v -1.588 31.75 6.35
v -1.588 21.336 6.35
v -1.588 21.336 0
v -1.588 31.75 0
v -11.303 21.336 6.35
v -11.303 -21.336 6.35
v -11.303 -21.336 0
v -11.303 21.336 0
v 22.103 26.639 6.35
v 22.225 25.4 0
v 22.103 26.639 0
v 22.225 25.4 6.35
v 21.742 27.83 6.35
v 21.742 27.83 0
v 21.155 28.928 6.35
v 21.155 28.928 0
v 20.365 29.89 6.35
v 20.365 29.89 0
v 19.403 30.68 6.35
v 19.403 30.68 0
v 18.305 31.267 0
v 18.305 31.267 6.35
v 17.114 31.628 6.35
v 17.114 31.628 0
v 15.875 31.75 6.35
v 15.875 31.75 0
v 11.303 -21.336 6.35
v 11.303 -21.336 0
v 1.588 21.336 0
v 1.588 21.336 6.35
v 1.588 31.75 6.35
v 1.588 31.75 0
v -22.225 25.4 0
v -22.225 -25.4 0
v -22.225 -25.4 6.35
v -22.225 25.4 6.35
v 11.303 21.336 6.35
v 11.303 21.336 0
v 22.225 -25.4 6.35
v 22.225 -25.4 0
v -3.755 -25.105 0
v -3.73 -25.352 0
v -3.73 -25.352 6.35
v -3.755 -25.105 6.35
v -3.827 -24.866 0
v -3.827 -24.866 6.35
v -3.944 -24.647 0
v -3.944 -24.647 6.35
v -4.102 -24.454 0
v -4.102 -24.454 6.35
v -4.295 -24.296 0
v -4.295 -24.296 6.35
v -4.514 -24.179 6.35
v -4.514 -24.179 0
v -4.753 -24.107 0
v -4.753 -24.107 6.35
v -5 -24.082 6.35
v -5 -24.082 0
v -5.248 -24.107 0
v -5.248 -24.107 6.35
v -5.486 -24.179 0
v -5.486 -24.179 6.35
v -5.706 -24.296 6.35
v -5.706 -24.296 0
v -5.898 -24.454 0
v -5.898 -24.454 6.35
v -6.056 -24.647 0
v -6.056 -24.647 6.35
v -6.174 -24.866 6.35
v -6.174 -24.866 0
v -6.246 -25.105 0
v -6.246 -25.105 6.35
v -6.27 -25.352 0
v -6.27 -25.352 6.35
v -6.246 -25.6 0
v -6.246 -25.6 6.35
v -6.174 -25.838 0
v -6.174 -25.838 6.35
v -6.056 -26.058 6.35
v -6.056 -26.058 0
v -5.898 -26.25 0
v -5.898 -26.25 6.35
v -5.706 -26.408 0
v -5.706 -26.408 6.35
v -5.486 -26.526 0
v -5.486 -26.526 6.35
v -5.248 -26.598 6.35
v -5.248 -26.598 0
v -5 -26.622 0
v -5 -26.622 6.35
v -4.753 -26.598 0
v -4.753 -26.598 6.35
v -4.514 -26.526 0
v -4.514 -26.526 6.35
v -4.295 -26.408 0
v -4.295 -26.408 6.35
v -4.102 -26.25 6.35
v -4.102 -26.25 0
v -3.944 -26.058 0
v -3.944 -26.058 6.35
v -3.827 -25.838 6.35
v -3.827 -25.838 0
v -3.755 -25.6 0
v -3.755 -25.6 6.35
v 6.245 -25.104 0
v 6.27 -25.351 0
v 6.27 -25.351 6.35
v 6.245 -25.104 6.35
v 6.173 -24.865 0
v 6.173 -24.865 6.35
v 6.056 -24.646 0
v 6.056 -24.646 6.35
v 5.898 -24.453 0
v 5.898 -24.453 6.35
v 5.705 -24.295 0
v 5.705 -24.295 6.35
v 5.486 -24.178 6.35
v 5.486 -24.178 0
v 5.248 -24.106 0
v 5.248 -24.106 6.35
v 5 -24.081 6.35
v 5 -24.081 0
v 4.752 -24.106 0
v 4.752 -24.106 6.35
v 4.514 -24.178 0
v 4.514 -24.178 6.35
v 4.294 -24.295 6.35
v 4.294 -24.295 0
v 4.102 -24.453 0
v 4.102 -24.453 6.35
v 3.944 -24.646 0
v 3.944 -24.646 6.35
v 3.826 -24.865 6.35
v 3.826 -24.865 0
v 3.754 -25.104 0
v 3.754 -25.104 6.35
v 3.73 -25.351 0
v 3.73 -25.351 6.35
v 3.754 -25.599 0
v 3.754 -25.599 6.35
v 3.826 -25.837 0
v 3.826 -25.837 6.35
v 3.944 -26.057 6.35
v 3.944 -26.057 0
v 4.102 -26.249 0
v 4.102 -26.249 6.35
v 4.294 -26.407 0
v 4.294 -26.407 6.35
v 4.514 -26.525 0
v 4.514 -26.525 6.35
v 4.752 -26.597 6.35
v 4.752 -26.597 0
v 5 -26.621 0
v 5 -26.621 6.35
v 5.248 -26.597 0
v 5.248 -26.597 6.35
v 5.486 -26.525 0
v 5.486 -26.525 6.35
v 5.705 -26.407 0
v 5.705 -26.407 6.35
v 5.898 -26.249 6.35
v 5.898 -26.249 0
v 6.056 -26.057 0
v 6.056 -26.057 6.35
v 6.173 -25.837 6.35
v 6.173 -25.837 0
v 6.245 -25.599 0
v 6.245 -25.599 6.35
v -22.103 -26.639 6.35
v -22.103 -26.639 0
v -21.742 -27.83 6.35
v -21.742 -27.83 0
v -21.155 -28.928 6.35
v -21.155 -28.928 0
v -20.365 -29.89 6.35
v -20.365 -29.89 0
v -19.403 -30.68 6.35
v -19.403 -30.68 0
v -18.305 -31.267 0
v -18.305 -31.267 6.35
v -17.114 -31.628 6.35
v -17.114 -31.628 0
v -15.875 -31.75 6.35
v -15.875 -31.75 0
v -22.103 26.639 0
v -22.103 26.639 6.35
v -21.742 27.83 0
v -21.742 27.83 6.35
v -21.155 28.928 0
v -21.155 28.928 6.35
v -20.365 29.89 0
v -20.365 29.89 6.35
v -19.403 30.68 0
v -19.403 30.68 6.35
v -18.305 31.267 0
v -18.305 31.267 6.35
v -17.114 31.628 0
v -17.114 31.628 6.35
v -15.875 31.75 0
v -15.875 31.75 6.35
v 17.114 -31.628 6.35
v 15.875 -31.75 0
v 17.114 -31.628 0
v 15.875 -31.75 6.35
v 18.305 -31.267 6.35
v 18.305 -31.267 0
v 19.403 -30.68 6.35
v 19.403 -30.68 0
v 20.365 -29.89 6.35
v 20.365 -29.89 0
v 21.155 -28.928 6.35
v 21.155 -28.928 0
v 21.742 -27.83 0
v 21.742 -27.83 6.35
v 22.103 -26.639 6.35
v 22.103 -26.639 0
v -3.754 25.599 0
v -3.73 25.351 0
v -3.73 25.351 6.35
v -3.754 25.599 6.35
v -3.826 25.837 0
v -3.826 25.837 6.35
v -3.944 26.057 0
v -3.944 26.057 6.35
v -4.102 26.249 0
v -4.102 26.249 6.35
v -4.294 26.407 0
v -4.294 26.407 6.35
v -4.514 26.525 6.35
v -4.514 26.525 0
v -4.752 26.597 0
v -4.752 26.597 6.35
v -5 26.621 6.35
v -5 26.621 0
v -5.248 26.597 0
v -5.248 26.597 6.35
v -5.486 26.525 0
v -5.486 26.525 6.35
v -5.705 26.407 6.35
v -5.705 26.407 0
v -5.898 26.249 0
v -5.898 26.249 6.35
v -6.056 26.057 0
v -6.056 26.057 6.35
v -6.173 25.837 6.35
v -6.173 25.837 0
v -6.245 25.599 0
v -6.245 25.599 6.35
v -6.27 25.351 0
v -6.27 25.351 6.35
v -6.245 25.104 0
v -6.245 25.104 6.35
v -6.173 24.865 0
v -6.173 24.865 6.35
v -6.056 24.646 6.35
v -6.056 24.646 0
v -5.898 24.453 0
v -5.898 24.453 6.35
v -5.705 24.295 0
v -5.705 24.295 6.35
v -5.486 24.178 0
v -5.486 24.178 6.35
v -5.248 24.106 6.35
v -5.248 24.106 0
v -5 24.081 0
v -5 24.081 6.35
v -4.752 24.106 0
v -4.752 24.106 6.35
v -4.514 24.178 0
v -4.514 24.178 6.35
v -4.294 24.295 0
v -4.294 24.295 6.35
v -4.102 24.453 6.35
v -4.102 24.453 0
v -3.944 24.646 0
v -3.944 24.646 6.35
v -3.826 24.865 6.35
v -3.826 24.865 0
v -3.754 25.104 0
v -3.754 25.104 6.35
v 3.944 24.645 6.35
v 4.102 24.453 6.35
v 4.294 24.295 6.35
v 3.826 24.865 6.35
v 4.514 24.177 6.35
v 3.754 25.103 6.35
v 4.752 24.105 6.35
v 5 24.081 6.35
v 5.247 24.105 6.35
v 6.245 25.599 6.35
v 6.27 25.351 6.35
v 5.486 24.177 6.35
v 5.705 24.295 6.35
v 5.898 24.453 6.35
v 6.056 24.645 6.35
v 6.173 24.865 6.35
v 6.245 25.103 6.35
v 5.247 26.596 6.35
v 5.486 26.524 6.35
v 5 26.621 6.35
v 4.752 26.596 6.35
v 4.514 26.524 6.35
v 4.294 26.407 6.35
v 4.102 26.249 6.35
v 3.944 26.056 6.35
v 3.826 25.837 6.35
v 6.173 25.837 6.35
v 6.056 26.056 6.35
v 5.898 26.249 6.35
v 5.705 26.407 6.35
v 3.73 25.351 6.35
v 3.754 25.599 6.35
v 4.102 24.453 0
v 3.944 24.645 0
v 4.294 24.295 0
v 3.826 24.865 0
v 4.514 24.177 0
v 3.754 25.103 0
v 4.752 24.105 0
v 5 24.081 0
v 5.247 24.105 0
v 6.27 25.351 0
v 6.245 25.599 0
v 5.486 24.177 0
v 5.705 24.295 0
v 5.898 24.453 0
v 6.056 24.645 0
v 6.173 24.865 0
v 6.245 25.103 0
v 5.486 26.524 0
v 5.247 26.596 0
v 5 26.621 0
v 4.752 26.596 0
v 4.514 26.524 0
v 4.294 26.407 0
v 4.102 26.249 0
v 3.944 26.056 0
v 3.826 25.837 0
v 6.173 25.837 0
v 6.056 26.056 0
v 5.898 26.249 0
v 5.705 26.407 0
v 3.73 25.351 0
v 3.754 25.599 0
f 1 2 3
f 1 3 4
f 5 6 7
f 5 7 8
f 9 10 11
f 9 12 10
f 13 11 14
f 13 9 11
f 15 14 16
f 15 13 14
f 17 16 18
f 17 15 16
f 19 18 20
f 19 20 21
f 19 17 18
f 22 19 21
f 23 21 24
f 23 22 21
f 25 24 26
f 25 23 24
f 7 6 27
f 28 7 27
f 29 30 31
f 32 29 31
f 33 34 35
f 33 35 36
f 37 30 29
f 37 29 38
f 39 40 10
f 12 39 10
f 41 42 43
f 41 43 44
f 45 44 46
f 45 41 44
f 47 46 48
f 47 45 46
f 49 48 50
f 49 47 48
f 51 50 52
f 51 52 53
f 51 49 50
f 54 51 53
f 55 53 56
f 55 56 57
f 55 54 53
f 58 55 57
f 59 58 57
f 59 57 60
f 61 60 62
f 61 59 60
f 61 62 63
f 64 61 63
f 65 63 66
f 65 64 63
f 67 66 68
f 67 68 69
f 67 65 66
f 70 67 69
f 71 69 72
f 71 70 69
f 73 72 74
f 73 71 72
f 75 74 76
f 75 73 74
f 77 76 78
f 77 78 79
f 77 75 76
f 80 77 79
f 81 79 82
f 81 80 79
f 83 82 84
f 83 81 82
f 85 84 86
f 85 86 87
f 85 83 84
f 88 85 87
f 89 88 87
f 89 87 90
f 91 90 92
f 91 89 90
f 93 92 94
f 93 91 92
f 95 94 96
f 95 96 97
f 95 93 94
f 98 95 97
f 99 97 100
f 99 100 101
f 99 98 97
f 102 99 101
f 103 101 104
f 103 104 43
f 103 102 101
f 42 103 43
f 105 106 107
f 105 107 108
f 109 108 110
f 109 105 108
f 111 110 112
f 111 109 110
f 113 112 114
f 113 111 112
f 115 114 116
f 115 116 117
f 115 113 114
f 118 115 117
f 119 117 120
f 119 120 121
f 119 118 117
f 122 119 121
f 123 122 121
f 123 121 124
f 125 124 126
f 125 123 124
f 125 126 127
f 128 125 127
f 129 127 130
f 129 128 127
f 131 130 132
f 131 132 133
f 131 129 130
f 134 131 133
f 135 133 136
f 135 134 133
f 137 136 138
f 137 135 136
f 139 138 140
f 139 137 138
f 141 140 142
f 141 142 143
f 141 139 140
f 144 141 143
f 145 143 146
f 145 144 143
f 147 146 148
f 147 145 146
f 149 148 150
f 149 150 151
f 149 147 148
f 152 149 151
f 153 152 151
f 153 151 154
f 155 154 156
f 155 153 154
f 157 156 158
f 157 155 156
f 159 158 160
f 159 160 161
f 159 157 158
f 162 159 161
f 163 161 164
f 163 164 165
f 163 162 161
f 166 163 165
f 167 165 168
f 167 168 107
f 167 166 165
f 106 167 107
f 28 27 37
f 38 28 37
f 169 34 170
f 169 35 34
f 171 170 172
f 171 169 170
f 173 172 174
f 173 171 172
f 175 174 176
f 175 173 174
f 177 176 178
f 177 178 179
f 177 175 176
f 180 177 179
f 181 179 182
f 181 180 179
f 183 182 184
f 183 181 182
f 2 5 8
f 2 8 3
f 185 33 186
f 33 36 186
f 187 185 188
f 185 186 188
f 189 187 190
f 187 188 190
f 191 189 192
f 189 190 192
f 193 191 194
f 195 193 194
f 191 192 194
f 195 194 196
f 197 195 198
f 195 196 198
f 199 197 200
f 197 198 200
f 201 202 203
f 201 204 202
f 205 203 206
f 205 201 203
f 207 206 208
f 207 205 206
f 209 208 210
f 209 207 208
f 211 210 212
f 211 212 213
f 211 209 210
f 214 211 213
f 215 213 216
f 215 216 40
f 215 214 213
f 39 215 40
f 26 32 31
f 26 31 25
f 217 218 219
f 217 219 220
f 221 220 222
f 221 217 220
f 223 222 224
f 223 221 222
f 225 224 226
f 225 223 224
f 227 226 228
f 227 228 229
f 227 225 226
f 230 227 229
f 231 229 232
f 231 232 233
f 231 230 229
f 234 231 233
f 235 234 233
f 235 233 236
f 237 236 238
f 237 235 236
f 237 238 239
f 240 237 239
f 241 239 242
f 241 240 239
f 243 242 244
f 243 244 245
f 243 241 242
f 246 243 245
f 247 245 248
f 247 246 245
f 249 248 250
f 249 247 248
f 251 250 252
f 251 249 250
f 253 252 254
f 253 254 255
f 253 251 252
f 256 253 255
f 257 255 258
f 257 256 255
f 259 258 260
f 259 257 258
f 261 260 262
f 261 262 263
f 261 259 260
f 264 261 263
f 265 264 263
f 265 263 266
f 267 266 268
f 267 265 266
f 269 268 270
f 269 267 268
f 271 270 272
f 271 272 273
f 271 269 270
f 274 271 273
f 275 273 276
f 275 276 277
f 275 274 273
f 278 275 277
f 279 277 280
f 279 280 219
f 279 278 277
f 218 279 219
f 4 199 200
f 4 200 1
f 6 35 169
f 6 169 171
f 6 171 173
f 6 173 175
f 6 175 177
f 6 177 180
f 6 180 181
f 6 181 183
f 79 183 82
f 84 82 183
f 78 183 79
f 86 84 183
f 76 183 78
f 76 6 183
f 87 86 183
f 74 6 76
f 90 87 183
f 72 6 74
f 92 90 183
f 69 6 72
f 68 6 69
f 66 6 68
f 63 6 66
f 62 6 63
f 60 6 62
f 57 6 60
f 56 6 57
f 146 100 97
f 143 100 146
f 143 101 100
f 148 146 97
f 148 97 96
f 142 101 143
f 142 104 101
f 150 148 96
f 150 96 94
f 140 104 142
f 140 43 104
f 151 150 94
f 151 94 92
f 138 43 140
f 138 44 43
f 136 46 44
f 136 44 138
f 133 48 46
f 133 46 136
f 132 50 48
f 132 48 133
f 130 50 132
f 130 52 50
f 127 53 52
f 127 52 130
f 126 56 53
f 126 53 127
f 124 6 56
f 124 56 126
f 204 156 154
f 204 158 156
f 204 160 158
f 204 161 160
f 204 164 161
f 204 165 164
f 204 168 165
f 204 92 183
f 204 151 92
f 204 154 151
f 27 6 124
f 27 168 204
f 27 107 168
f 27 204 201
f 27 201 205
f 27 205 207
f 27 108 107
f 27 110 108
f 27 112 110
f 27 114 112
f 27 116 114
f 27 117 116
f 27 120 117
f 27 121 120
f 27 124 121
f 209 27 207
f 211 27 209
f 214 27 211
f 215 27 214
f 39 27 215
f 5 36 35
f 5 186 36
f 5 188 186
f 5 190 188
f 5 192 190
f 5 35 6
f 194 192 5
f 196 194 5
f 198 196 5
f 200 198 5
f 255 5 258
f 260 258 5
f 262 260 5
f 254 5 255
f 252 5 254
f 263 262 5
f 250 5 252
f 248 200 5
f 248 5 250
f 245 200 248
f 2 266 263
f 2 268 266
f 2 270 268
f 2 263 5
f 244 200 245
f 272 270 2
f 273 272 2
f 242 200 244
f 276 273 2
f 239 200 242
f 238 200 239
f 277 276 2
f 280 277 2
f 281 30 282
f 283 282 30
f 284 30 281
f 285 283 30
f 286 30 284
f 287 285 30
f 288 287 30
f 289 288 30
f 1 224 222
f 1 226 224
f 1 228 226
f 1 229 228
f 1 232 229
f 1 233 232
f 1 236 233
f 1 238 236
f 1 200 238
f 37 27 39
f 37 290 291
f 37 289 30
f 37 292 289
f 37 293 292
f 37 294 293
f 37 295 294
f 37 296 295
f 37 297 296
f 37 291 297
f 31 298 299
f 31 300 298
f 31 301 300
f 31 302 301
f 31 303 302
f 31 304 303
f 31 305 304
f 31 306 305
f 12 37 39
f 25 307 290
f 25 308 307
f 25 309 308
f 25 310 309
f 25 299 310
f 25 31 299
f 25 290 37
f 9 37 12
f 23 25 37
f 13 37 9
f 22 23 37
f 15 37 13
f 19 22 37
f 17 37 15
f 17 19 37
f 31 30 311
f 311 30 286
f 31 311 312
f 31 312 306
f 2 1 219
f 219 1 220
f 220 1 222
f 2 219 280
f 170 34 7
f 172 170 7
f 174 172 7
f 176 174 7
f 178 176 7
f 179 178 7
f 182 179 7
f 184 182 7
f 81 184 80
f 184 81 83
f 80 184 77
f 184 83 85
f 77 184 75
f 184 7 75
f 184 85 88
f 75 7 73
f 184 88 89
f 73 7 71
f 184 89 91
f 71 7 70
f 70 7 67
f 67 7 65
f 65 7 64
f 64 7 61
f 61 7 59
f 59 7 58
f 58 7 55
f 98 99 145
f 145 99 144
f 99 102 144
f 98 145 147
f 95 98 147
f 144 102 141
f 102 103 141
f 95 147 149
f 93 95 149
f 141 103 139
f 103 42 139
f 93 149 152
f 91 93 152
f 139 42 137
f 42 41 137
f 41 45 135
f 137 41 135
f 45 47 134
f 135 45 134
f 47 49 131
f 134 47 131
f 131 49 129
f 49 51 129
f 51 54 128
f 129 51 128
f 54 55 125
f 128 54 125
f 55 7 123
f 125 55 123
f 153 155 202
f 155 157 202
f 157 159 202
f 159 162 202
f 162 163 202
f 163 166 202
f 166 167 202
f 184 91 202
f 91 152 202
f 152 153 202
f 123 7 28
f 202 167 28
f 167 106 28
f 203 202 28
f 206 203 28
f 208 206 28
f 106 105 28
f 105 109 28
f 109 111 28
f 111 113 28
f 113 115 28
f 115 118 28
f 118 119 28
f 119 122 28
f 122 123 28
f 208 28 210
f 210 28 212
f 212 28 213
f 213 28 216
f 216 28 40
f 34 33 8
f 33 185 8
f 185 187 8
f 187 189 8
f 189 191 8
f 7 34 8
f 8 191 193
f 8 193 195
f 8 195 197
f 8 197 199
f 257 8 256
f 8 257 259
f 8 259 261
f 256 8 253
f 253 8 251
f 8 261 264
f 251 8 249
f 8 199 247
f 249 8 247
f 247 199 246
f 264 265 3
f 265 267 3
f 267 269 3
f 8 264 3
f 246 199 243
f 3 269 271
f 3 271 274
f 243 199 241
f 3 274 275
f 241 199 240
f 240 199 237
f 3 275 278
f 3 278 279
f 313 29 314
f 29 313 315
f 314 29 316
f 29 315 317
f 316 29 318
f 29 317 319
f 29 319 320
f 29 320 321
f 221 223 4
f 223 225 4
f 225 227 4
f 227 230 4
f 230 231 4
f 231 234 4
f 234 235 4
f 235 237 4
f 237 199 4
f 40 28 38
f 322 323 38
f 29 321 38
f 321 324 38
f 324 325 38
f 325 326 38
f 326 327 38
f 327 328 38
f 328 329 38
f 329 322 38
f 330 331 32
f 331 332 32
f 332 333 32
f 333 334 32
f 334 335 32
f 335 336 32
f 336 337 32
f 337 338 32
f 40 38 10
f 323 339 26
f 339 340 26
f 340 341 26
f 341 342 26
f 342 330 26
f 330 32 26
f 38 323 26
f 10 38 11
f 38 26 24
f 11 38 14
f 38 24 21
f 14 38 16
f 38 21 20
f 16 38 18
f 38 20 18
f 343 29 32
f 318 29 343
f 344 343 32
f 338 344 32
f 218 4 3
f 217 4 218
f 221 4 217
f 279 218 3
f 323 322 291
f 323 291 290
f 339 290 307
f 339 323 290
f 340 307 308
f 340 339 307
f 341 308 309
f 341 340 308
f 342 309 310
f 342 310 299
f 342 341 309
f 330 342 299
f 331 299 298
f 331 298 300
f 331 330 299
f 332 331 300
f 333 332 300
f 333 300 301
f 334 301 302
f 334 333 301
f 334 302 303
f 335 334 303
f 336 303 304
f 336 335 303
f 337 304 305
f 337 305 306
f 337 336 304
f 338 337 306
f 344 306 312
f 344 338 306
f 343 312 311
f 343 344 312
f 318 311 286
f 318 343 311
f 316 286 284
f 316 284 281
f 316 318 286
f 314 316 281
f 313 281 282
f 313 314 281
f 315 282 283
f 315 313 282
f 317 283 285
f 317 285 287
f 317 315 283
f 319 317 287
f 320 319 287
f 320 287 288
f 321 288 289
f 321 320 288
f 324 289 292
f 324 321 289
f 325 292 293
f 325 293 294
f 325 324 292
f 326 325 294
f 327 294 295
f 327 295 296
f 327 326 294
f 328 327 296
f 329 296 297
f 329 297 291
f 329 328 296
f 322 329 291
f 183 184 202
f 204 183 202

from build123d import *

# Parameters (mm, degrees)
SKETCH1_W           = 44.45
SKETCH1_H           = 63.5
SKETCH1_R           = 1.27
BOSS_EXTRUDE1_DEPTH = 6.35
SKETCH2_W           = 22.606
SKETCH2_H           = 42.672
CUT_EXTRUDE1_DEPTH  = 7.35
SKETCH3_W           = 3.175
SKETCH3_H           = 16.248427567
CUT_EXTRUDE2_DEPTH  = 7.35
FILLET1_R           = 6.35


with BuildPart() as part:
    # Sketch1 → Boss-Extrude1 (new body)
    with BuildSketch(Plane.XY):
        Rectangle(SKETCH1_W, SKETCH1_H)
        with Locations((-4.999806813, 25.351447061)):
            Circle(SKETCH1_R, mode=Mode.SUBTRACT)
        with Locations((4.999565199, 25.350804136)):
            Circle(SKETCH1_R, mode=Mode.SUBTRACT)
        with Locations((-5.000419542, -25.352292054)):
            Circle(SKETCH1_R, mode=Mode.SUBTRACT)
        with Locations((4.999806813, -25.351447061)):
            Circle(SKETCH1_R, mode=Mode.SUBTRACT)
    extrude(amount=BOSS_EXTRUDE1_DEPTH)

    # Sketch2 → Cut-Extrude1 (cut, through all)
    with BuildSketch(Plane.XY.offset(6.35)):
        Rectangle(SKETCH2_W, SKETCH2_H)
    extrude(amount=-CUT_EXTRUDE1_DEPTH, mode=Mode.SUBTRACT)

    # Sketch3 → Cut-Extrude2 (cut, through all)
    with BuildSketch(Plane.XY.offset(6.35)):
        with Locations((0, 27.215647874)):
            Rectangle(SKETCH3_W, SKETCH3_H)
    extrude(amount=-CUT_EXTRUDE2_DEPTH, mode=Mode.SUBTRACT)

    # Fillet1
    fillet1_edges = [part.edges().sort_by_distance(p)[0] for p in [
        (-22.225, 31.75, 3.175),
        (22.225, 31.75, 3.175),
        (22.225, -31.75, 3.175),
        (-22.225, -31.75, 3.175),
    ]]
    fillet(fillet1_edges, radius=FILLET1_R)


solid = part.part
